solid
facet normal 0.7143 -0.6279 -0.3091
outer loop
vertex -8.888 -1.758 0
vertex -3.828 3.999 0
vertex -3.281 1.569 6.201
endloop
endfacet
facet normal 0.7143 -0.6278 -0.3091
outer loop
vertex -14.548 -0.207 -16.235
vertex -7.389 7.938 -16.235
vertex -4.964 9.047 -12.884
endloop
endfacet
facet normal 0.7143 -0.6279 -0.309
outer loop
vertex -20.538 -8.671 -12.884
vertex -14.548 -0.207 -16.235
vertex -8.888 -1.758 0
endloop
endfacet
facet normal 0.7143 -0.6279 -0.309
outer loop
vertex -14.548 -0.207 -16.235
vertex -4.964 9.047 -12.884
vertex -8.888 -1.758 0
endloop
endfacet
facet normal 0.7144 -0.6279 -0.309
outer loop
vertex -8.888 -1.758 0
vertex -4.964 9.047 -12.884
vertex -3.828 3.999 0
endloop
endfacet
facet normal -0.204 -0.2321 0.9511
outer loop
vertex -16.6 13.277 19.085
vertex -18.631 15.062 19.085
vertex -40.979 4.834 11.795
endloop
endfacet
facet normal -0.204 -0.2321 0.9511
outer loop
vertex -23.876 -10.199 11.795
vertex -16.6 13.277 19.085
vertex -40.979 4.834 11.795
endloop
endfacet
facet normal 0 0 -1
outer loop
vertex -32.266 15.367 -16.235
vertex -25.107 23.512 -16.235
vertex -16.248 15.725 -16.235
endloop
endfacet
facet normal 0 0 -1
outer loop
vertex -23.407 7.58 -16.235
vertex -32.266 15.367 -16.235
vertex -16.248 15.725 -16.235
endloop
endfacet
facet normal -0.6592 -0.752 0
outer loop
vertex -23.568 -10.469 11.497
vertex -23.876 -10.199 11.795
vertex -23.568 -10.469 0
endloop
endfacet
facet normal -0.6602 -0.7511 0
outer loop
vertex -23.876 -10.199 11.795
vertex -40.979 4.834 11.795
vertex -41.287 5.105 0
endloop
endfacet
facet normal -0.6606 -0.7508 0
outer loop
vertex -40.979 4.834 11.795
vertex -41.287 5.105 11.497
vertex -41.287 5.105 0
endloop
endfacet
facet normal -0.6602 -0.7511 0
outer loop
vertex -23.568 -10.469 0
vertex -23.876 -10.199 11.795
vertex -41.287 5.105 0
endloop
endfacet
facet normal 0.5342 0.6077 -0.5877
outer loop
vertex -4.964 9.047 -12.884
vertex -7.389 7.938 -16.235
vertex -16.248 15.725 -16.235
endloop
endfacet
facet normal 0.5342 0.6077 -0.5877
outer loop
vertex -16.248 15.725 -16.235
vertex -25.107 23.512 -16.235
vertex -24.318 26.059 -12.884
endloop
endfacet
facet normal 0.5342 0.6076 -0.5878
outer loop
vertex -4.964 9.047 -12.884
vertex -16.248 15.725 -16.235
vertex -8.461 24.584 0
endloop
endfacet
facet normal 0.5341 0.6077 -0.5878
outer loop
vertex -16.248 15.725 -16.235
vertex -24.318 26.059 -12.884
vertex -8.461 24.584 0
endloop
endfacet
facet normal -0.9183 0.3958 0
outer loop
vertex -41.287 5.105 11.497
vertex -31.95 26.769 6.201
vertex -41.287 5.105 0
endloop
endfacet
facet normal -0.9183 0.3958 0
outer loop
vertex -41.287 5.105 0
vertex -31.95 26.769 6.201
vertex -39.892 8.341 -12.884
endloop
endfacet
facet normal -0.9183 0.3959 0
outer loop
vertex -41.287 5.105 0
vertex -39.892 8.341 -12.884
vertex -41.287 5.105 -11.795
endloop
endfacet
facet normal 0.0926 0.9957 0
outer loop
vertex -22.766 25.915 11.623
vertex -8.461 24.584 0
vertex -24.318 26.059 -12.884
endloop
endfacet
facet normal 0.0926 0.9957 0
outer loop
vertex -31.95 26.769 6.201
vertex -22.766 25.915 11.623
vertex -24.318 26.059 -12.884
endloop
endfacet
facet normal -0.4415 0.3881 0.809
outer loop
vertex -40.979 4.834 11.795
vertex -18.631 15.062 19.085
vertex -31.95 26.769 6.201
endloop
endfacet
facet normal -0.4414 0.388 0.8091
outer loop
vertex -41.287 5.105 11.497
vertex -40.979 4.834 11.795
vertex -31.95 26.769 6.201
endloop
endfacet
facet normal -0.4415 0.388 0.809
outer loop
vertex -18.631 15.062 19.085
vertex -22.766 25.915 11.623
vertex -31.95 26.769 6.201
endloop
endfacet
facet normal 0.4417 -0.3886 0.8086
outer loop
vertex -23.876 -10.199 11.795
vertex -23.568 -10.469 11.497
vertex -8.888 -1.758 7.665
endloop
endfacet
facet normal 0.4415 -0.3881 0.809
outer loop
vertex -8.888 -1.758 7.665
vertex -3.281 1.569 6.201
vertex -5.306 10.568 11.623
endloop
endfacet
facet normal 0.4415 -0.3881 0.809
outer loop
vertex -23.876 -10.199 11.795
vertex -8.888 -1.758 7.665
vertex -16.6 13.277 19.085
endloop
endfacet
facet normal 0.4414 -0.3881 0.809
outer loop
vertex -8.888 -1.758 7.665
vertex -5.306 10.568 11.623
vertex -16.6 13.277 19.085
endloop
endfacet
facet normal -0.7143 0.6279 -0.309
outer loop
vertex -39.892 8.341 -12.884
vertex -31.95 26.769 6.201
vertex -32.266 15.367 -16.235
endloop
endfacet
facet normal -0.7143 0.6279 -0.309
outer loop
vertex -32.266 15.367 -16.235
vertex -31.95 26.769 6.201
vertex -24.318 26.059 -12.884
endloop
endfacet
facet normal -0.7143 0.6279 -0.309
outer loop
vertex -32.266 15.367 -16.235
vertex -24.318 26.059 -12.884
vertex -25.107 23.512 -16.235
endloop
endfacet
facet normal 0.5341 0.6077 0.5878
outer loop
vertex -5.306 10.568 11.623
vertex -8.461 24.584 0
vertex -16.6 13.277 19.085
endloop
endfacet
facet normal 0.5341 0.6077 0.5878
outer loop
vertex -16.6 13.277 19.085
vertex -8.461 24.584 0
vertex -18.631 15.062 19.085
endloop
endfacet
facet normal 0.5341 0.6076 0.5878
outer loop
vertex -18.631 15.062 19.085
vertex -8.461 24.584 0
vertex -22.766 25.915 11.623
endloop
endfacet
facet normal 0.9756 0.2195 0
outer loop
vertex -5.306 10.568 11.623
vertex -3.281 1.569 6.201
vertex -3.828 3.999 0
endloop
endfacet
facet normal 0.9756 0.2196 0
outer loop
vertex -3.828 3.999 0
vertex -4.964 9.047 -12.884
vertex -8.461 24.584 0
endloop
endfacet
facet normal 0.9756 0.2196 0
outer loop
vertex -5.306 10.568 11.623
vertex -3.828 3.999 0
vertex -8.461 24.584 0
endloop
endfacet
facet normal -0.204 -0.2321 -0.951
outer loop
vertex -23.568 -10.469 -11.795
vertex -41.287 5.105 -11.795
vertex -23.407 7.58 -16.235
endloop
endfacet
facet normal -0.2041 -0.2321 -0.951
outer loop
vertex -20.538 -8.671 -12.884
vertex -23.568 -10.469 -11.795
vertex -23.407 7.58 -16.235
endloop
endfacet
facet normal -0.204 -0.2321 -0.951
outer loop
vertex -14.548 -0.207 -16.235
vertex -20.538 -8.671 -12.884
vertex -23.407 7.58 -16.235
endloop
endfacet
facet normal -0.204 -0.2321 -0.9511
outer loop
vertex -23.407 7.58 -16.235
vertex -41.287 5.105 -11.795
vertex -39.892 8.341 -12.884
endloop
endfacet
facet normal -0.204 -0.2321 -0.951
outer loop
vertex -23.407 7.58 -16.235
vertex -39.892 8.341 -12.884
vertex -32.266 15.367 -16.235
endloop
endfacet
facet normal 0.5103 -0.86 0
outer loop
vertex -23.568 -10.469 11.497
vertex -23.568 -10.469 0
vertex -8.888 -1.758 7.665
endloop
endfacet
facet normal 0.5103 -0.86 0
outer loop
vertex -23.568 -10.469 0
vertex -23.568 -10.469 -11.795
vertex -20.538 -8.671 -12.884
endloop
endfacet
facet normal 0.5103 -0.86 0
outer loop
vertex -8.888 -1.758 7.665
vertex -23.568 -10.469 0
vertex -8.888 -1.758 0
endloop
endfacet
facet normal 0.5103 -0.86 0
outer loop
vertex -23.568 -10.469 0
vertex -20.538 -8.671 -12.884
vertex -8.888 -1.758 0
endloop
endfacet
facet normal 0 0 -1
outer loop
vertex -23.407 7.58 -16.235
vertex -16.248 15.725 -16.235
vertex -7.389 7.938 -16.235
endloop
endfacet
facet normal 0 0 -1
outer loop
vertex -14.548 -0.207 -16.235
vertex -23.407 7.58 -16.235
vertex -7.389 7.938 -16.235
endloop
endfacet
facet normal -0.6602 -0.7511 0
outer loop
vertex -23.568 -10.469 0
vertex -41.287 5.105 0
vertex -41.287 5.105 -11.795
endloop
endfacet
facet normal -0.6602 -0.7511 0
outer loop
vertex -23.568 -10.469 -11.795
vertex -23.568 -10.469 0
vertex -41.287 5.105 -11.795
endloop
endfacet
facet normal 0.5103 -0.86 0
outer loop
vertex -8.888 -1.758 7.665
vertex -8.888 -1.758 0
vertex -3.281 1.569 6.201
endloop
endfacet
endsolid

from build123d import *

# Parameters (mm, degrees)
F1_DEPTH = 25.4
F2_DEPTH = 25.4
F3_COUNT = 2
F3_ANGLE = 90
F4_COUNT = 2
F4_ANGLE = 90


with BuildPart() as f1:
    # F0 (on Top) → F1 (new body)
    with BuildSketch(Plane.XY):
        Polygon((-23.5681033644, -10.4691434878), (-8.8881384679, -1.757956216), (-21.7093285173, 9.5116151497), (-32.4273278005, -2.6820611935), align=None)
        Polygon((-8.8881384679, -1.757956216), (-3.2808908311, 1.5694212395), (-8.4611528206, 24.5838280055), (-21.7093285173, 9.5116151497), align=None)
        Polygon((-32.4273278005, -2.6820611935), (-21.7093285173, 9.5116151497), (-34.5305185668, 20.7811865153), (-41.2865522365, 5.1050211008), align=None)
        Polygon((-21.7093285173, 9.5116151497), (-8.4611528206, 24.5838280055), (-31.9499433341, 26.7689488904), (-34.5305185668, 20.7811865153), align=None)
    extrude(amount=-F1_DEPTH)

    # F2 (add): a face of the model
    f2_faces = [f1.faces().sort_by_distance(p)[0] for p in [
        (-21.7093285173, 9.5116151497, 0),
    ]]
    extrude(f2_faces, amount=F2_DEPTH)


with BuildPart() as f3_1:
    # F3: instance of F1
    add(f1.part.rotate(Axis((-20.8140740816, 10.5301301305, 0), (0.6601960829, 0.7510932913, 0)), 1 * F3_ANGLE / (F3_COUNT - 1)))


with BuildPart() as f4_1:
    # F4: instance of F1
    add(f1.part.rotate(Axis((-21.7093285173, 9.5116151497, 0), (0.7510932913, -0.6601960829, 0)), 1 * F4_ANGLE / (F4_COUNT - 1)))


with BuildPart() as f3_1_1:
    add(f3_1.part)

    # F5: intersect F4_1, F1
    add(f4_1.part, mode=Mode.INTERSECT)
    add(f1.part, mode=Mode.INTERSECT)


solid = f3_1_1.part
